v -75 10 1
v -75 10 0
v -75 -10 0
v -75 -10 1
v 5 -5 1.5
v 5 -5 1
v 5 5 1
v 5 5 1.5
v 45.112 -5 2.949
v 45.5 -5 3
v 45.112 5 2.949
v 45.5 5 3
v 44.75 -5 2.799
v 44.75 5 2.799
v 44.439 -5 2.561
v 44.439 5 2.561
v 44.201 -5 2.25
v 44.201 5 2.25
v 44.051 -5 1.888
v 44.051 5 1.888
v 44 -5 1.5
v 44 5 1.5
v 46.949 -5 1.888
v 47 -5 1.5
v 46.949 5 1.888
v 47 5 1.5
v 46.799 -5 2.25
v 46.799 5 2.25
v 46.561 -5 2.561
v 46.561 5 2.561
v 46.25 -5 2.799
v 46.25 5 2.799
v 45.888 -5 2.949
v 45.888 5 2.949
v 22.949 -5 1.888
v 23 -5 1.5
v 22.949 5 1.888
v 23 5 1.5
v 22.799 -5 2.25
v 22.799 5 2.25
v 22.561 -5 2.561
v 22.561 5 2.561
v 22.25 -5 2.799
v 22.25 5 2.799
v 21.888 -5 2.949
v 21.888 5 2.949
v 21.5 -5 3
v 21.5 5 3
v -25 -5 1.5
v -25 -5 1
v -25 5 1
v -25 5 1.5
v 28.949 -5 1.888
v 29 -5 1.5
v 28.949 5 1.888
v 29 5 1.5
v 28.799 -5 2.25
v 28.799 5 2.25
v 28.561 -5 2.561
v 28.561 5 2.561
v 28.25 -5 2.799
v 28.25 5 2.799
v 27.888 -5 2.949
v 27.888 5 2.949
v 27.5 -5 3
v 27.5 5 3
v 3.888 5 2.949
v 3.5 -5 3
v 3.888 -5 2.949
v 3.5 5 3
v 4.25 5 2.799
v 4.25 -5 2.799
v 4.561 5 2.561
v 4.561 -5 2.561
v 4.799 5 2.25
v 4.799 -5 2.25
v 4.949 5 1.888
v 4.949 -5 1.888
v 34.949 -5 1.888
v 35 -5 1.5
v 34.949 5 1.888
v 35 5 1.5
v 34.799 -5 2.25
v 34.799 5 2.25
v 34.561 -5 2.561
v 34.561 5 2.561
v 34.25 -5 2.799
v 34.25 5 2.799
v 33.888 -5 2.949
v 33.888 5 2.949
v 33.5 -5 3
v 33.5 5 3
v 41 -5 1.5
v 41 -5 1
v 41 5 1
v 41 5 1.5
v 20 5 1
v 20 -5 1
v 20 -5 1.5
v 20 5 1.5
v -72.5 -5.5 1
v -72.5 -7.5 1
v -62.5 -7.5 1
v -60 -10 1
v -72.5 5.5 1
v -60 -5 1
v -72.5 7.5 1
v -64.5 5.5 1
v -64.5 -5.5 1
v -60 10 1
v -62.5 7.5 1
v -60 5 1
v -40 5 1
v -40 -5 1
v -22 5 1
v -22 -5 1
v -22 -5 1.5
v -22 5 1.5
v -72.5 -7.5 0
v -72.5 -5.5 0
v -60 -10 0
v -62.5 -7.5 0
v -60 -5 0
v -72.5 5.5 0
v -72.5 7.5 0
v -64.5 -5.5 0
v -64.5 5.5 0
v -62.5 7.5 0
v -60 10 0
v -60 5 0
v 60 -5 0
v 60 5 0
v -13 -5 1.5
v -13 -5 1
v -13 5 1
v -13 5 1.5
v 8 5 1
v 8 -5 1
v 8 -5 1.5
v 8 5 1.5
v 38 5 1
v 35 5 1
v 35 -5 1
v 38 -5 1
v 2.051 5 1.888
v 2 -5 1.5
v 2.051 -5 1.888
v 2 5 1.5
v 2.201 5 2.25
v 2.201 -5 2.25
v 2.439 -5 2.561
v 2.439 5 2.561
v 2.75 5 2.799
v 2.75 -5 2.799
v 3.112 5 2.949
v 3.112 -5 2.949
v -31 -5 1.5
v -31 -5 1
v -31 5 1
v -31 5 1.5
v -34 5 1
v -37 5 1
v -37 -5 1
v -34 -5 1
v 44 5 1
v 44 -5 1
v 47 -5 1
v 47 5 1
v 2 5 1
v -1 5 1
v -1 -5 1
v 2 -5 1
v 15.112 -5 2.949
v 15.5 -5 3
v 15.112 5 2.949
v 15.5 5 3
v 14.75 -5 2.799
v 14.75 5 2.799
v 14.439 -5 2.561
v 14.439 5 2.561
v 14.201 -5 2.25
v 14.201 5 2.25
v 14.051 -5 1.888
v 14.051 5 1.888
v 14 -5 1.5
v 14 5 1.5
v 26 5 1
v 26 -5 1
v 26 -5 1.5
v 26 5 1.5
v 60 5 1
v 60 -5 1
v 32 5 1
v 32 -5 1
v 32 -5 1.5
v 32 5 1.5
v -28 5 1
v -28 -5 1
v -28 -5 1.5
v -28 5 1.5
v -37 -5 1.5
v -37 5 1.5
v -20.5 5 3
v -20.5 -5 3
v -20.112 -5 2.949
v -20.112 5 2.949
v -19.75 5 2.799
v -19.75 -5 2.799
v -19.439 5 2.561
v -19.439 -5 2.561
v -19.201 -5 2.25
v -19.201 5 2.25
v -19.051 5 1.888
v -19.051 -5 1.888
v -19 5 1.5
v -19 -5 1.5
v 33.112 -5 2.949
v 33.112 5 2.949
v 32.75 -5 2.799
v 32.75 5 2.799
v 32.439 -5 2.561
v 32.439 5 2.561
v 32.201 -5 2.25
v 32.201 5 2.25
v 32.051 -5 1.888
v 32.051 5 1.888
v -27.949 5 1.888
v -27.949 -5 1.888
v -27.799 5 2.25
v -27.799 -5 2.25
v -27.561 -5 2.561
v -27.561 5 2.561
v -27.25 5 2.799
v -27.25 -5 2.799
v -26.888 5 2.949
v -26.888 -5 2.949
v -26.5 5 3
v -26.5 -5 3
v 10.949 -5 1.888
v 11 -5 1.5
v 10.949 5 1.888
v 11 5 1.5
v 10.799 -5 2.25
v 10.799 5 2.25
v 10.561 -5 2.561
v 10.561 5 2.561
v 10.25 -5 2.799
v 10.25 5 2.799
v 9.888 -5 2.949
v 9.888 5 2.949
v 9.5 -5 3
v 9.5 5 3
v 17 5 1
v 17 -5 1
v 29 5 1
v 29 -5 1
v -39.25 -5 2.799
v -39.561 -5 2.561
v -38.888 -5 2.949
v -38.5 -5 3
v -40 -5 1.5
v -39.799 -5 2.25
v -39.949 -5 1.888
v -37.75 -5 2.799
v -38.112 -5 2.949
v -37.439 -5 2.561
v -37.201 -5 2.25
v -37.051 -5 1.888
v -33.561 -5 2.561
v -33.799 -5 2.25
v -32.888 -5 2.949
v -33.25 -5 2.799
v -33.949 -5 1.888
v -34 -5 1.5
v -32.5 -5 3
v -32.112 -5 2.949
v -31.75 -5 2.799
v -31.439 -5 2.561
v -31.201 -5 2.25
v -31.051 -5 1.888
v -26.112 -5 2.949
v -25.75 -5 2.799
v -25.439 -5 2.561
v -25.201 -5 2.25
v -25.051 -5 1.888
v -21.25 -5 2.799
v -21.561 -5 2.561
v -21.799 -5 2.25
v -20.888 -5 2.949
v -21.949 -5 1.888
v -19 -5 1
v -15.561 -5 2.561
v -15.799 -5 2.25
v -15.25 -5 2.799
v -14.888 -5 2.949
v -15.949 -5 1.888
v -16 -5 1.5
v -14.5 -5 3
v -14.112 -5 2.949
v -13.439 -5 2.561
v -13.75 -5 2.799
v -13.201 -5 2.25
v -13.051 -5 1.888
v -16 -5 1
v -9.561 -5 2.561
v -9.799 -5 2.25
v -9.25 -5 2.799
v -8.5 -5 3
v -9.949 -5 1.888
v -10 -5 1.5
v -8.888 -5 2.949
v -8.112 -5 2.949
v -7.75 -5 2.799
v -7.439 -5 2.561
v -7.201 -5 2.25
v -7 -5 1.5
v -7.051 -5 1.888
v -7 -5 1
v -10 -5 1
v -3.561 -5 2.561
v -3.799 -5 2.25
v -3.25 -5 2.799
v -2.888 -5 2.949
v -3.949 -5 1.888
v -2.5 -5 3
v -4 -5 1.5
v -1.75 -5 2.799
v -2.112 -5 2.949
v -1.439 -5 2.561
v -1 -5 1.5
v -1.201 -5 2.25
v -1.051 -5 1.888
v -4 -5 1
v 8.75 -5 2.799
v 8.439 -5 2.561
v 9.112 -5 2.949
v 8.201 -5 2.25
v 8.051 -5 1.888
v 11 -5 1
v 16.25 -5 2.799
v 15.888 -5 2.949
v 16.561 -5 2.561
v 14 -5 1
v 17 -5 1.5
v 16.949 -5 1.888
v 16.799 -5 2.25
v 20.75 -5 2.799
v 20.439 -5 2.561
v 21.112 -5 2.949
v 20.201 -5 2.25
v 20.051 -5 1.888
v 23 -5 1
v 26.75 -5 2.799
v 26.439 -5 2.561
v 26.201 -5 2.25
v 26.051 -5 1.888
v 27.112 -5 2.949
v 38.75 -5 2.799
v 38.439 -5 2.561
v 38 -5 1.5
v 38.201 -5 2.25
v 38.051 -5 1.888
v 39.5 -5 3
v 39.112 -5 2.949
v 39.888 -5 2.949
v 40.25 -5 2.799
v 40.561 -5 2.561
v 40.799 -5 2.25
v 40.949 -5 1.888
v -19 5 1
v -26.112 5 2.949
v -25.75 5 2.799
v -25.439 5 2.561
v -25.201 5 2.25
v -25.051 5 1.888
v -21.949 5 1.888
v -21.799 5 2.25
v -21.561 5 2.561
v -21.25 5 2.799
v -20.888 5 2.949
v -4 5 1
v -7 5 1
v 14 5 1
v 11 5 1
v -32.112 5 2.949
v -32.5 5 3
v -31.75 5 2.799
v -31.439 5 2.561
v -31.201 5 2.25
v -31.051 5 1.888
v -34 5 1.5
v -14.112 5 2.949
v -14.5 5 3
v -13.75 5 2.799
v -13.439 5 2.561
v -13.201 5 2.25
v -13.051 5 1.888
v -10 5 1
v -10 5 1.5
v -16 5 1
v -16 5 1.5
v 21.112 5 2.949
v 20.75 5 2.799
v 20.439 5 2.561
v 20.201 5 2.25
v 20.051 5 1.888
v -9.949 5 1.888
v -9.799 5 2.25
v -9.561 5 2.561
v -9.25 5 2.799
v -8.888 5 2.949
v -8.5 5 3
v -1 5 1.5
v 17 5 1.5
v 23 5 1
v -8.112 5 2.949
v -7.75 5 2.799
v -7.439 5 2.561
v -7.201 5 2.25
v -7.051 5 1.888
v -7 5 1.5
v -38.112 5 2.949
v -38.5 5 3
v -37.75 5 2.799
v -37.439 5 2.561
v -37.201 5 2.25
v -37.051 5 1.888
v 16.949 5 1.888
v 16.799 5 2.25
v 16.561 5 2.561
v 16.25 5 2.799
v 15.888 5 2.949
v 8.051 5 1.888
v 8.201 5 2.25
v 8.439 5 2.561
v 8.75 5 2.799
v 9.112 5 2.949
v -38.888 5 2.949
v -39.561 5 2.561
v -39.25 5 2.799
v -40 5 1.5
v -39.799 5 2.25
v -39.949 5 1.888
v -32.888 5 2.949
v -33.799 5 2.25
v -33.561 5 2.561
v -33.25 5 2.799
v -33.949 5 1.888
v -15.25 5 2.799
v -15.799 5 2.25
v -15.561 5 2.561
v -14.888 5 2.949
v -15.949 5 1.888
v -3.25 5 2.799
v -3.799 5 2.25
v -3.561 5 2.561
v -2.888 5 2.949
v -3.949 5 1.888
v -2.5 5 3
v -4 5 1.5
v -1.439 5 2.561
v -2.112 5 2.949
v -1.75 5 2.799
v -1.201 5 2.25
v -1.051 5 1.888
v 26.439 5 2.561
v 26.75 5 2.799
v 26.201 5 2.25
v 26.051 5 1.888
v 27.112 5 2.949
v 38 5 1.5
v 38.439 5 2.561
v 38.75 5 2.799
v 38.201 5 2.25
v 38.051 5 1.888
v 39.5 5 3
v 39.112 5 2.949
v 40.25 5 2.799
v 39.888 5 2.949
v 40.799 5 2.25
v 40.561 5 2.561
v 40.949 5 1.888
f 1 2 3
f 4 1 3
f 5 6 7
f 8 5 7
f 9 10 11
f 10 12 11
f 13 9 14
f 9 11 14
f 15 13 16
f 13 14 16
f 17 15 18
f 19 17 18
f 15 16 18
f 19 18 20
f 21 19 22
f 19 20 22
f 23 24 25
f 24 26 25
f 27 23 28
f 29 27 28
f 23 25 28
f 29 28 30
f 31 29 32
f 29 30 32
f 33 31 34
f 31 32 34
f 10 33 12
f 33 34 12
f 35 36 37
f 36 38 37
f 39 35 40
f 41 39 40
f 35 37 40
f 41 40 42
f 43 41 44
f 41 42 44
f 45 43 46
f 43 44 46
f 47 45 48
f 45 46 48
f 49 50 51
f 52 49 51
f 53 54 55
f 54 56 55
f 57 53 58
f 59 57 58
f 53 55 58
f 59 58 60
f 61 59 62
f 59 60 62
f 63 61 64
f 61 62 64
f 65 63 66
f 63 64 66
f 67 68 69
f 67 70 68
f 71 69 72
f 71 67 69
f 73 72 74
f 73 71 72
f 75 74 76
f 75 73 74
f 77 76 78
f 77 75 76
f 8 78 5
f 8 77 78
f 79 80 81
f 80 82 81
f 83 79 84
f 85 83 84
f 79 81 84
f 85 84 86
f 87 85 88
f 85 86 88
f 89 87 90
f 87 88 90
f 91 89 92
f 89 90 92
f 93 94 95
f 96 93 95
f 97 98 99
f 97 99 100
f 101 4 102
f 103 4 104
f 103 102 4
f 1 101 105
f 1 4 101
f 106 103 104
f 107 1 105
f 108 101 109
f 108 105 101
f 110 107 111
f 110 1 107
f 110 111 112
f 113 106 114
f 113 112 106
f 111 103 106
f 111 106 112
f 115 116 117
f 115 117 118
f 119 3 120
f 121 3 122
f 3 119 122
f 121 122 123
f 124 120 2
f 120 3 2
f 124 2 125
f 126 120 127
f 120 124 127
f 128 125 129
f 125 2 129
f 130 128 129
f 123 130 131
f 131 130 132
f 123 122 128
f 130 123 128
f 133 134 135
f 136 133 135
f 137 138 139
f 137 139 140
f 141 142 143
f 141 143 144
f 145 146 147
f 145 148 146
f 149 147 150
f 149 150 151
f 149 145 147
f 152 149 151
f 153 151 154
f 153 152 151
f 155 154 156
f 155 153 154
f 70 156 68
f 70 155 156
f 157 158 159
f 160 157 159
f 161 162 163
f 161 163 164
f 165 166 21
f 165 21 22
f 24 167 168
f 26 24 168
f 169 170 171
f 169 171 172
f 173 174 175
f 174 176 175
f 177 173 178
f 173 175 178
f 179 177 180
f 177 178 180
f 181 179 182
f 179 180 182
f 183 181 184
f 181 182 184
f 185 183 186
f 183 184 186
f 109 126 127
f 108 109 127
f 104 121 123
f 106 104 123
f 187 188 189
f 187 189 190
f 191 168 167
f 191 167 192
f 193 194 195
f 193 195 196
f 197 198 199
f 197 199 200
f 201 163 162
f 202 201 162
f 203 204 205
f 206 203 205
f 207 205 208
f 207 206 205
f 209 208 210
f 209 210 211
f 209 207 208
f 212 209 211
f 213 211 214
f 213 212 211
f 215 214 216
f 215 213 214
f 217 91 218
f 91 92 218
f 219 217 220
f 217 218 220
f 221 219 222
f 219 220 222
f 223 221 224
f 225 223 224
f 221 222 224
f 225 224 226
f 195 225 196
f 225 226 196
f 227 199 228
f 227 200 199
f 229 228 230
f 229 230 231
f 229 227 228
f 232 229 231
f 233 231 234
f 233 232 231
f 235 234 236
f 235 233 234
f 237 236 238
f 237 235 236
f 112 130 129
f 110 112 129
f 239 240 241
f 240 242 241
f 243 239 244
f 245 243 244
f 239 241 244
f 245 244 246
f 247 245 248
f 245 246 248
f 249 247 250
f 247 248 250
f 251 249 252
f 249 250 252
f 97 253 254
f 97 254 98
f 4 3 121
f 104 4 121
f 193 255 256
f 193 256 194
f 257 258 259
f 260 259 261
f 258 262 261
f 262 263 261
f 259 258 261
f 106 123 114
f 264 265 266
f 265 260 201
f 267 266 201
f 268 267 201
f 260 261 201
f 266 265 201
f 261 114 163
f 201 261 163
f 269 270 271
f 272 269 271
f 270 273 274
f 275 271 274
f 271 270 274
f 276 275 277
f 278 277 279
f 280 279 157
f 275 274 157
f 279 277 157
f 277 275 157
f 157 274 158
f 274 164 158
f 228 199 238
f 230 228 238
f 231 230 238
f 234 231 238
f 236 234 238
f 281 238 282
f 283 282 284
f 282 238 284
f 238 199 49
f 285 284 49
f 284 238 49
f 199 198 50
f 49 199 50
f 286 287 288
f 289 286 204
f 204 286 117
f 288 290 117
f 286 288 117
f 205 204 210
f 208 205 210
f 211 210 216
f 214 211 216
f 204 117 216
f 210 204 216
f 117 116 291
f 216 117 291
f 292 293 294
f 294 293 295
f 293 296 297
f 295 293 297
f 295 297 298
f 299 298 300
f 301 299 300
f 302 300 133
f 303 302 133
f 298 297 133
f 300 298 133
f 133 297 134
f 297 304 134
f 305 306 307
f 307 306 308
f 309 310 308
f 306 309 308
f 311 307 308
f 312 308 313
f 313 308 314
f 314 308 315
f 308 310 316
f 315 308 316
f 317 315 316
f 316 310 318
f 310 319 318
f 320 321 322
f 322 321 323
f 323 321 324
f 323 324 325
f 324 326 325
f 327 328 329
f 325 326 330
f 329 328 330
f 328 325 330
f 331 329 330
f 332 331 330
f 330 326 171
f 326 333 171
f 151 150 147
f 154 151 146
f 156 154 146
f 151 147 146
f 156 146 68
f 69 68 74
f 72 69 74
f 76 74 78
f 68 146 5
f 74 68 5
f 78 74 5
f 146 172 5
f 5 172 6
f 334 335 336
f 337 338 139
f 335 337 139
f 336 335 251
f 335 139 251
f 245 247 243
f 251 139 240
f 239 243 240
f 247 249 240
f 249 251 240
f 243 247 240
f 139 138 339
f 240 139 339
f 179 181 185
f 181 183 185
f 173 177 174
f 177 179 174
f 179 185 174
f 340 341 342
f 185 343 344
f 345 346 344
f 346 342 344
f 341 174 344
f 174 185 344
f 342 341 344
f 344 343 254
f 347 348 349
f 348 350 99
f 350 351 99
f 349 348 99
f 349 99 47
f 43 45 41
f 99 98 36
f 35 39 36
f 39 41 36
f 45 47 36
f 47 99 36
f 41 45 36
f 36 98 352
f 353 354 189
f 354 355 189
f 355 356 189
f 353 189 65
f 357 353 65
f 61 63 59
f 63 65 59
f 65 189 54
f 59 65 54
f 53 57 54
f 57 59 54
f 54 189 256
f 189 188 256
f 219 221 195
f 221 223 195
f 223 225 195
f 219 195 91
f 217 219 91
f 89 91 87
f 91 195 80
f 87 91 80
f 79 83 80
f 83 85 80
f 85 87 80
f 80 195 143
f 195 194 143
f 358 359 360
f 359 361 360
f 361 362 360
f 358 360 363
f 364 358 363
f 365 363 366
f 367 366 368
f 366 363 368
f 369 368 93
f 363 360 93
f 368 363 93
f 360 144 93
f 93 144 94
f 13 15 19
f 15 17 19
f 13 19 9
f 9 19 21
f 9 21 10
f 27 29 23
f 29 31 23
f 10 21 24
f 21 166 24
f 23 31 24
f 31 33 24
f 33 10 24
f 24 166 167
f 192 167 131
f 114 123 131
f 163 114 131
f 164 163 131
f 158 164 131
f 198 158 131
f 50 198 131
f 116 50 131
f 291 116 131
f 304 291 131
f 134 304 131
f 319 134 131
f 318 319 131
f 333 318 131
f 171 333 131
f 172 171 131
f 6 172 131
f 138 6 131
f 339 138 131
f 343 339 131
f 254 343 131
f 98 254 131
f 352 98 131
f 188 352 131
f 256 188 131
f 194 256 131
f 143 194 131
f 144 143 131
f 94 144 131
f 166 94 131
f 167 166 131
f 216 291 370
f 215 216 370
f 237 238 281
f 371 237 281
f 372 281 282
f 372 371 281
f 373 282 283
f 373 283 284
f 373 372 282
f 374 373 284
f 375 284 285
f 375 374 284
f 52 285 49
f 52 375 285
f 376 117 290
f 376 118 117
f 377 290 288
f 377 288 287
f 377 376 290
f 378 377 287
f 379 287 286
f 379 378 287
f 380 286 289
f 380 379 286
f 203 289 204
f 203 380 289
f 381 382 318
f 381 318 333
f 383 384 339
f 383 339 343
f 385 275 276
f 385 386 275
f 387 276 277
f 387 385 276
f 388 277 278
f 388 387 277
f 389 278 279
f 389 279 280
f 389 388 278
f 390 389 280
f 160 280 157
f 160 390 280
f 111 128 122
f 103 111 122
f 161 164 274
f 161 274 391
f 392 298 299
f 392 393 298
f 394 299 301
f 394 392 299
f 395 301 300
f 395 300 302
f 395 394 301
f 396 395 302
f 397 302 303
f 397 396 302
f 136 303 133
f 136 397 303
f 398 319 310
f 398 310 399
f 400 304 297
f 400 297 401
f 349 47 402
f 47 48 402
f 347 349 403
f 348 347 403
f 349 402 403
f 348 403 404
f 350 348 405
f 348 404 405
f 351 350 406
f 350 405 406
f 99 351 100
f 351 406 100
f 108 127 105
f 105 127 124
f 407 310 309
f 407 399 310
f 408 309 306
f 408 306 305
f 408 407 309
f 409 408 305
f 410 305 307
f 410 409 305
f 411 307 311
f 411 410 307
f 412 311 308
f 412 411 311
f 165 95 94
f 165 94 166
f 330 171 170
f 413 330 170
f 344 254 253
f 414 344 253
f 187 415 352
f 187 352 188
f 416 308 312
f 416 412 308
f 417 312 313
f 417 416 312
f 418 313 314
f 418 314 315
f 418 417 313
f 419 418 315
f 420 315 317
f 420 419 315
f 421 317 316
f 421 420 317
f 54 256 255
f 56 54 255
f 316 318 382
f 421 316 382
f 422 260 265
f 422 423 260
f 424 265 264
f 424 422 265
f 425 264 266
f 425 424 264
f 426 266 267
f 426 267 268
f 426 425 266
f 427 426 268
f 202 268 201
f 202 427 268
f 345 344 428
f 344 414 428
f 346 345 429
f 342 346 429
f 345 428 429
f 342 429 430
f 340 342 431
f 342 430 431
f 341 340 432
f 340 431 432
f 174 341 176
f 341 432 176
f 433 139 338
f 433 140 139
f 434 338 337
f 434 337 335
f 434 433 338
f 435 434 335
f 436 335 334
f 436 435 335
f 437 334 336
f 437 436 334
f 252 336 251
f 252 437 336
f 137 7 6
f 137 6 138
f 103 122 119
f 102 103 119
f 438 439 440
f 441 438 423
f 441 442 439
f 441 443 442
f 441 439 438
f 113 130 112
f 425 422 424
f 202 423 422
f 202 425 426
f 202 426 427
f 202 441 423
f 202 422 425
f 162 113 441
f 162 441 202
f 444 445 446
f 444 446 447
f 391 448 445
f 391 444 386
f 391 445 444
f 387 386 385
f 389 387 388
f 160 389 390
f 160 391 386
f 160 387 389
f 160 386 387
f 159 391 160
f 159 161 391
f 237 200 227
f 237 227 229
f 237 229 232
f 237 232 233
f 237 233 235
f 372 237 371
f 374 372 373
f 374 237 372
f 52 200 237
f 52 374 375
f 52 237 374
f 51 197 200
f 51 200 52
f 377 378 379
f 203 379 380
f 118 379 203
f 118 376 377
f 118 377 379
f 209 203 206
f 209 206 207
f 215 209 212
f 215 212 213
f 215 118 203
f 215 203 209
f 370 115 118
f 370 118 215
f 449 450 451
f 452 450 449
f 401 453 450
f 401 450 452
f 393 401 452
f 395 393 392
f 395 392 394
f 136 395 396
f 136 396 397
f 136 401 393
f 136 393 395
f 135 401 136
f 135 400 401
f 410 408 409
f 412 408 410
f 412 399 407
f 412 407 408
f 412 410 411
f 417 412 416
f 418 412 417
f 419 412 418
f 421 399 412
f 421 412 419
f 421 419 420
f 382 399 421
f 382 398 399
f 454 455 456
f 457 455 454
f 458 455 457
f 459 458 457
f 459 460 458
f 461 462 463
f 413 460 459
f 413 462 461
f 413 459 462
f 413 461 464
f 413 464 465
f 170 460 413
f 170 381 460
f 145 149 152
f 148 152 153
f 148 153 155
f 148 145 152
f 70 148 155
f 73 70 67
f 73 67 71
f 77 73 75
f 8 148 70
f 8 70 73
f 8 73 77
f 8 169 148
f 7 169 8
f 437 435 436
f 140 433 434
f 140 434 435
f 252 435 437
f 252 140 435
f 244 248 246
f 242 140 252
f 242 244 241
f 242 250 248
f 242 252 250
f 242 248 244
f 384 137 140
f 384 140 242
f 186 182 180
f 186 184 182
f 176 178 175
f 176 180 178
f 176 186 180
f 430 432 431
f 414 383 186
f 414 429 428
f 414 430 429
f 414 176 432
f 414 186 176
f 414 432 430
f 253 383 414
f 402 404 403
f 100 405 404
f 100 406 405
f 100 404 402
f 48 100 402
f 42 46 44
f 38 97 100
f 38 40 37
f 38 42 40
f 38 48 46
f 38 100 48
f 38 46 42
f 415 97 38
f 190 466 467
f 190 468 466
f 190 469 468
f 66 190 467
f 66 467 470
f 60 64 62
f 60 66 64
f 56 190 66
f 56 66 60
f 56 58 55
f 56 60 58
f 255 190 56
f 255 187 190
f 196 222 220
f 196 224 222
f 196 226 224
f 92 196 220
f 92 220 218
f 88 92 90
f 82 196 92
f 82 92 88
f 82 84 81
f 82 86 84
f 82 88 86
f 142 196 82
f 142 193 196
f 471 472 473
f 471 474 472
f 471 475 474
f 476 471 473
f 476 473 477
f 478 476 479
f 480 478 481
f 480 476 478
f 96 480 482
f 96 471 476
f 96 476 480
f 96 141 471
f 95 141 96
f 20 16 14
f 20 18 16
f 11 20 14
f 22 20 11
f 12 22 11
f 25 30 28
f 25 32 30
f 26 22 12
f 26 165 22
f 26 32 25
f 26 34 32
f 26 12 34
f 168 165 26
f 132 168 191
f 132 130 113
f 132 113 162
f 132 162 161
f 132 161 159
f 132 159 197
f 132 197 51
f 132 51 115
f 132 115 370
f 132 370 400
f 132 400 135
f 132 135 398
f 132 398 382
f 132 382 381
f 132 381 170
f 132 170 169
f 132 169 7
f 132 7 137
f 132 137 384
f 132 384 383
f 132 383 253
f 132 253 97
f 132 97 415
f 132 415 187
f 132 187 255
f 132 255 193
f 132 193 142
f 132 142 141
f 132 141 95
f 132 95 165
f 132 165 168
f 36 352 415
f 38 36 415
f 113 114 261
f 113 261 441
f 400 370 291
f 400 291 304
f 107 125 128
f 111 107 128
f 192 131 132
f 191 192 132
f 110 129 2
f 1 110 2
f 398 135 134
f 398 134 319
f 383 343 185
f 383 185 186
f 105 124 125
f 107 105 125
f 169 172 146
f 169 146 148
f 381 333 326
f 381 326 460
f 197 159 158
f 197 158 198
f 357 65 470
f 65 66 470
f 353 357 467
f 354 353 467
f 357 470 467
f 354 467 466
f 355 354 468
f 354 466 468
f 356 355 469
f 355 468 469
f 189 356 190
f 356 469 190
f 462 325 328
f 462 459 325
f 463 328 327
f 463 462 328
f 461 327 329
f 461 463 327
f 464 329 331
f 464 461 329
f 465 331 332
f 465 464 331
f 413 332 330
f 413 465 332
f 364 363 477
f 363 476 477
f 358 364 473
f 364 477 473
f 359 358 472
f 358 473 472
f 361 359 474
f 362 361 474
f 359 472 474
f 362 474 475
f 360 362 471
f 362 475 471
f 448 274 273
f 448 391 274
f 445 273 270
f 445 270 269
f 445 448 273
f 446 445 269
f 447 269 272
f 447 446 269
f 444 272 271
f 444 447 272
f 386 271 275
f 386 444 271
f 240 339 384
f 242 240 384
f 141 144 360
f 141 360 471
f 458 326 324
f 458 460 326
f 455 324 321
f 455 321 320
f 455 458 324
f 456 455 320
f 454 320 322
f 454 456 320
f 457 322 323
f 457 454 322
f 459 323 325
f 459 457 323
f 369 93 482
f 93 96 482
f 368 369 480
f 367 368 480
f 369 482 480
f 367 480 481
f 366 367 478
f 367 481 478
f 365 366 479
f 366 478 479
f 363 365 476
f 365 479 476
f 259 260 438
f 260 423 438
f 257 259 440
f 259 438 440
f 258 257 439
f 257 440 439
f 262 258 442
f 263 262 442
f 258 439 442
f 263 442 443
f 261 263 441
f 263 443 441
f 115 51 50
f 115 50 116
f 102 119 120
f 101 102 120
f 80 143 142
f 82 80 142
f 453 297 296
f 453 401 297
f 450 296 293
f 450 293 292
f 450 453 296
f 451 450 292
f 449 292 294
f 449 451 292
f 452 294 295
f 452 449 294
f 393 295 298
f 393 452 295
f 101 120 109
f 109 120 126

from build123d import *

# Parameters (mm, degrees)
F0_W     = 120
F0_H     = 10
F1_DEPTH = 1
F2_W     = 3
F2_H     = 10
F3_DEPTH = 3
F4_R     = 1.5
F5_R     = 1.49999
F6_R     = 1.49999


# Not quite as in the source:
# - a fillet or chamfer is up to 0.001 mm smaller than in the source, because OpenCascade refuses the exact size


with BuildPart() as f1:
    # F0 (on Top) → F1 (new body)
    with BuildSketch(Plane.XY):
        Rectangle(F0_W, F0_H)
        Polygon((-60, -5), (-60, 5), (-60, 10), (-75, 10), (-75, -10), (-60, -10), align=None)
        Polygon((-72.5, 5.5), (-72.5, 7.5), (-62.5, 7.5), (-62.5, -7.5), (-72.5, -7.5), (-72.5, -5.5), (-64.5, -5.5), (-64.5, 5.5), align=None, mode=Mode.SUBTRACT)
    extrude(amount=F1_DEPTH)

    # F2 (on Top) → F3 (join)
    with BuildSketch(Plane.XY):
        with Locations((-38.5, 0)):
            Rectangle(F2_W, F2_H)
        with Locations((-32.5, 0)):
            Rectangle(F2_W, F2_H)
        with Locations((-26.5, 0)):
            Rectangle(F2_W, F2_H)
        with Locations((-20.5, 0)):
            Rectangle(F2_W, F2_H)
        with Locations((-14.5, 0)):
            Rectangle(F2_W, F2_H)
        with Locations((-8.5, 0)):
            Rectangle(F2_W, F2_H)
        with Locations((-2.5, 0)):
            Rectangle(F2_W, F2_H)
        with Locations((3.5, 0)):
            Rectangle(F2_W, F2_H)
        with Locations((9.5, 0)):
            Rectangle(F2_W, F2_H)
        with Locations((15.5, 0)):
            Rectangle(F2_W, F2_H)
        with Locations((21.5, 0)):
            Rectangle(F2_W, F2_H)
        with Locations((27.5, 0)):
            Rectangle(F2_W, F2_H)
        with Locations((33.5, 0)):
            Rectangle(F2_W, F2_H)
        with Locations((39.5, 0)):
            Rectangle(F2_W, F2_H)
        with Locations((45.5, 0)):
            Rectangle(F2_W, F2_H)
    extrude(amount=F3_DEPTH)

    # F4
    f4_edges = [f1.edges().sort_by_distance(p)[0] for p in [
        (-40, 0, 3),
    ]]
    fillet(f4_edges, radius=F4_R)

    # F5 (radius 1.5 in the source; OpenCascade refuses exactly that, so slightly less here)
    f5_edges = [f1.edges().sort_by_distance(p)[0] for p in [
        (-37, 0, 3),
    ]]
    fillet(f5_edges, radius=F5_R)

    # F6 (radius 1.5 in the source; OpenCascade refuses exactly that, so slightly less here)
    f6_edges = [f1.edges().sort_by_distance(p)[0] for p in [
        (-34, 0, 3),
        (-31, 0, 3),
        (-28, 0, 3),
        (-25, 0, 3),
        (-22, 0, 3),
        (-19, 0, 3),
        (-16, 0, 3),
        (-13, 0, 3),
        (-10, 0, 3),
        (-7, 0, 3),
        (-4, 0, 3),
        (-1, 0, 3),
        (2, 0, 3),
        (5, 0, 3),
        (8, 0, 3),
        (11, 0, 3),
        (14, 0, 3),
        (17, 0, 3),
        (20, 0, 3),
        (23, 0, 3),
        (26, 0, 3),
        (29, 0, 3),
        (32, 0, 3),
        (35, 0, 3),
        (38, 0, 3),
        (41, 0, 3),
        (44, 0, 3),
        (47, 0, 3),
    ]]
    fillet(f6_edges, radius=F6_R)


solid = f1.part
